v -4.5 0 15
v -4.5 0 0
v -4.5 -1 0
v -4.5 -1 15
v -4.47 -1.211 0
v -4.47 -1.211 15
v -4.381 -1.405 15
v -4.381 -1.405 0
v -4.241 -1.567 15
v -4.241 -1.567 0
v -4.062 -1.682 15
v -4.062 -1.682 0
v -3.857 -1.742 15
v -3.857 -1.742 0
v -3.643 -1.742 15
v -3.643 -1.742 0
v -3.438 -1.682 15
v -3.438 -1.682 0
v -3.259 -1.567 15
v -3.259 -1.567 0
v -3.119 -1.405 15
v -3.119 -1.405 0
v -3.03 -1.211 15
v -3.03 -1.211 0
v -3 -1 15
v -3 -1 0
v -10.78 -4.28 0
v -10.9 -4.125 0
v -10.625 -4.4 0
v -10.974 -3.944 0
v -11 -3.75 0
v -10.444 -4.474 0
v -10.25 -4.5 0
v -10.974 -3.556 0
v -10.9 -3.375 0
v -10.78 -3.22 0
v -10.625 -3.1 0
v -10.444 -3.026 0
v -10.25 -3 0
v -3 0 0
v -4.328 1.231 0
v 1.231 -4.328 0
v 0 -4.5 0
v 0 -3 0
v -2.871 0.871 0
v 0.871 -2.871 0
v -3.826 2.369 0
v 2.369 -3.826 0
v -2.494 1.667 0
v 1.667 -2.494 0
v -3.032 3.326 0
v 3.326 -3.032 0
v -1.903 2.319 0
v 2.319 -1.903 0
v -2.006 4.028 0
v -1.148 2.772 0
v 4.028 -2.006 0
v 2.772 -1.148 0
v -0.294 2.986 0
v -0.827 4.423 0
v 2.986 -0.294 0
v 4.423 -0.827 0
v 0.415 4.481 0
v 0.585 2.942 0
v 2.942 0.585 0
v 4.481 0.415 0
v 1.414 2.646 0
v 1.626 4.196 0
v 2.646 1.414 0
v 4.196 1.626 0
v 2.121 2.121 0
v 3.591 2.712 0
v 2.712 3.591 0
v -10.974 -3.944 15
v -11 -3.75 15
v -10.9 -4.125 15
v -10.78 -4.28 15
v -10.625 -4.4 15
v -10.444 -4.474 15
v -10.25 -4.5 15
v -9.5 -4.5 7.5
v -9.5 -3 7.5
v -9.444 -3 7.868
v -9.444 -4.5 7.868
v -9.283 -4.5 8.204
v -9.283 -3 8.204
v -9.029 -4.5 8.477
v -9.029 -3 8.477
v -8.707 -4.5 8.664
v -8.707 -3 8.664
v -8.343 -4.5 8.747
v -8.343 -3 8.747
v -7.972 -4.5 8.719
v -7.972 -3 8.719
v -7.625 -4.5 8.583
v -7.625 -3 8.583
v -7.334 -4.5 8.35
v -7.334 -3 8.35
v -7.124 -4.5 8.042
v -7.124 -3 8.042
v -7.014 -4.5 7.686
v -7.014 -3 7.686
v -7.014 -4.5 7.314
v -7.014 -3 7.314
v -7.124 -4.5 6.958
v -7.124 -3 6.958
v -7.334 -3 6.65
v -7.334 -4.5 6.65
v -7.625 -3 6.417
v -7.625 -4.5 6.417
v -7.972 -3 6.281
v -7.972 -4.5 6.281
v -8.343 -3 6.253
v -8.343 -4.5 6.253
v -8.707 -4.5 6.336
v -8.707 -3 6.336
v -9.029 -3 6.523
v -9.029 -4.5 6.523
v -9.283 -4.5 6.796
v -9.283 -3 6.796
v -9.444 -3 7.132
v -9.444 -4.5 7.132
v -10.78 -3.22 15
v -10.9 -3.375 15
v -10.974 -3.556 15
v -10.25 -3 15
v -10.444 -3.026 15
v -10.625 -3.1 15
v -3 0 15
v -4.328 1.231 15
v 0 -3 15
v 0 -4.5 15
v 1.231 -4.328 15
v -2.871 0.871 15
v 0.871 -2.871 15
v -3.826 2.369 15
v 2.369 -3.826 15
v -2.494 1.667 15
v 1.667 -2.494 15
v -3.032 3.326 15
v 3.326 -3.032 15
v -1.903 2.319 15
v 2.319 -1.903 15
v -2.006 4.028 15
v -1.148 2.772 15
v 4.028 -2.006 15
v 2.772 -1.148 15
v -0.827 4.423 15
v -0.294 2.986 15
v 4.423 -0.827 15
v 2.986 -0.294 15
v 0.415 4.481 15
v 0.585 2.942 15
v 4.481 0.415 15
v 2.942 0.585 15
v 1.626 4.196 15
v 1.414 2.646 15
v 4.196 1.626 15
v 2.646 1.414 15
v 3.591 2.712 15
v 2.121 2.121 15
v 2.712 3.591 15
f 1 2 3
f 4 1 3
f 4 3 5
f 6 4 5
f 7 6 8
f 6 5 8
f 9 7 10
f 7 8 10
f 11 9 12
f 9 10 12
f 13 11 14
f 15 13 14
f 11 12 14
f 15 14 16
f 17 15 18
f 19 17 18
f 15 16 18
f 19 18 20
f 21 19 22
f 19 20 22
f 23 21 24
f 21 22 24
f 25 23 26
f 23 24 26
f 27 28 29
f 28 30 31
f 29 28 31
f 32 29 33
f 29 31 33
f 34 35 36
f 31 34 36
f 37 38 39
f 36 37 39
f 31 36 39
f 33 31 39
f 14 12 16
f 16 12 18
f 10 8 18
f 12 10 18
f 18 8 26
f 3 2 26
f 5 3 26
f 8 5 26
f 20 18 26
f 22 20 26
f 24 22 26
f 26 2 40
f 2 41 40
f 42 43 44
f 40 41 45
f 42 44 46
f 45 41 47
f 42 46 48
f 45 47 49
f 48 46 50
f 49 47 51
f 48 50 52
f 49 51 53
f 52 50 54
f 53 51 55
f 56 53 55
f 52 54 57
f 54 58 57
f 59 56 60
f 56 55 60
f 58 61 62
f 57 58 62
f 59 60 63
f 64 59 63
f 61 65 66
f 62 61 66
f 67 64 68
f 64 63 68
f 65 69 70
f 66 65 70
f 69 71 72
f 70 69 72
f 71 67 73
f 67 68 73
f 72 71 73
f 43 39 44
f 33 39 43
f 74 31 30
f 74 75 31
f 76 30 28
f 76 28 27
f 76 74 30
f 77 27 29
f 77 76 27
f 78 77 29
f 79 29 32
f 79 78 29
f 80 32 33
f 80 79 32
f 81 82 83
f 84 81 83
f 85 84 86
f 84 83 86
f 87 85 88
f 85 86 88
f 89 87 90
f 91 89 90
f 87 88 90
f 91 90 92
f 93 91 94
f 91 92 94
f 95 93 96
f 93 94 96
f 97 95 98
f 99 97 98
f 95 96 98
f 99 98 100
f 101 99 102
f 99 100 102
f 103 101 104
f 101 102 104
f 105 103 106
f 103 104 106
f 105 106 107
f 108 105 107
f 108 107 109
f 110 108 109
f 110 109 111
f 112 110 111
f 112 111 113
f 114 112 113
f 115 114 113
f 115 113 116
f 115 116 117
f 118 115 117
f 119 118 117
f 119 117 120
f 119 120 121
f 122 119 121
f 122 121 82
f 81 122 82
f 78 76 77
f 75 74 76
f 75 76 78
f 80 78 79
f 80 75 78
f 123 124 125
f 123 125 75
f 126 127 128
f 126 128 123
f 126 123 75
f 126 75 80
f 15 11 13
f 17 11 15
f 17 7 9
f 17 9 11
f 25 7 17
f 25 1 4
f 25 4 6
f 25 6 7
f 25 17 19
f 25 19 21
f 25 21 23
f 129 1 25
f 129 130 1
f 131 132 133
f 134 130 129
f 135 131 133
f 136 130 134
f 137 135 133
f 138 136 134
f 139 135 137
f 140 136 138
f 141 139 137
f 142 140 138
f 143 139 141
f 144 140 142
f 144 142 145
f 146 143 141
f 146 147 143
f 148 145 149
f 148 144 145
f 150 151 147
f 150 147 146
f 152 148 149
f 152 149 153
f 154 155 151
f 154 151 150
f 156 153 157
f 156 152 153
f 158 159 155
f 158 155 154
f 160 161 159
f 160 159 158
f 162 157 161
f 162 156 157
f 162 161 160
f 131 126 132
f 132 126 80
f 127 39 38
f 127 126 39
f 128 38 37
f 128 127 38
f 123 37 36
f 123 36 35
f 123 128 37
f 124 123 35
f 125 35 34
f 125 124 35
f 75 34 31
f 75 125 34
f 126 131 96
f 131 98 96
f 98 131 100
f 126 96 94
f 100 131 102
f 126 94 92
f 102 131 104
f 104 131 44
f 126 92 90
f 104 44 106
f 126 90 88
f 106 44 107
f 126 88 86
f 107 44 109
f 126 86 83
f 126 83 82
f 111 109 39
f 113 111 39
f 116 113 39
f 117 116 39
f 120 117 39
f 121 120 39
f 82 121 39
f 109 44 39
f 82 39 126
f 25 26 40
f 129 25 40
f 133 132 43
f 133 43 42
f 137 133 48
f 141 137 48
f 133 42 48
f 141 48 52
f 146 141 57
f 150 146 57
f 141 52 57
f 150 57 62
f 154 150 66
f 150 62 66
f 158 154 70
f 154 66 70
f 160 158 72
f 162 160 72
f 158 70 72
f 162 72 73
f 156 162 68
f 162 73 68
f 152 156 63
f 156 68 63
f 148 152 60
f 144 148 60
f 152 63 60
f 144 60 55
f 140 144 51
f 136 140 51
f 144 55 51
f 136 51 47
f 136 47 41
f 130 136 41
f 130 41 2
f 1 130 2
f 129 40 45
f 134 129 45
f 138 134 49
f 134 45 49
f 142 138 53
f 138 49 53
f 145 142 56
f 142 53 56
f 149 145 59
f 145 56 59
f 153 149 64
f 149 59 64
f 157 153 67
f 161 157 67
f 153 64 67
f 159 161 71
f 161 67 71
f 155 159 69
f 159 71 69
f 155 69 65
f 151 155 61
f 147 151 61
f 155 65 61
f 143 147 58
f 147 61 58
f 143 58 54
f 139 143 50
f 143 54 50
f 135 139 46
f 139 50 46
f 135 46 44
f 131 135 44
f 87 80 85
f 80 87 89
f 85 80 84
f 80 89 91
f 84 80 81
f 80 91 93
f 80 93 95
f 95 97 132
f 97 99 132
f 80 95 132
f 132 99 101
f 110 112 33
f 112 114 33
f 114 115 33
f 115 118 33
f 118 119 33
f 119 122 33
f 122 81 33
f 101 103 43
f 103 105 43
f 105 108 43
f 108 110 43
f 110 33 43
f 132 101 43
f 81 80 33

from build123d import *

# Parameters (mm, degrees)
F1_DEPTH = 15
F2_R     = 0.74999
F3_R     = 1.25
F4_DEPTH = 8.2


# Not quite as in the source:
# - a fillet or chamfer is up to 0.001 mm smaller than in the source, because OpenCascade refuses the exact size


with BuildPart() as f1:
    # F0 (on Top) → F1 (new body)
    with BuildSketch(Plane.XY):
        with BuildLine():
            ThreePointArc((-3, 0), (2.1213203436, 2.1213203436), (0, -3))
            Line((0, -3), (-11, -3))
            Line((-11, -3), (-11, -4.5))
            Line((-11, -4.5), (0, -4.5))
            ThreePointArc((0, -4.5), (3.1819805153, 3.1819805153), (-4.5, 0))
            Line((-4.5, 0), (-4.5, -1))
            ThreePointArc((-4.5, -1), (-3.75, -1.75), (-3, -1))
            Line((-3, -1), (-3, 0))
        make_face()
    extrude(amount=F1_DEPTH)

    # F2 (radius 0.75 in the source; OpenCascade refuses exactly that, so slightly less here)
    f2_edges = [f1.edges().sort_by_distance(p)[0] for p in [
        (-11, -3, 7.5),
        (-11, -4.5, 7.5),
    ]]
    fillet(f2_edges, radius=F2_R)

    # F3 (on face) → F4 (cut)
    with BuildSketch(Plane(origin=(0, -3, 0), x_dir=(-1, 0, 0), z_dir=(0, 1, 0))):
        with Locations((8.25, 7.5)):
            Circle(F3_R)
    extrude(amount=-F4_DEPTH, mode=Mode.SUBTRACT)


solid = f1.part
